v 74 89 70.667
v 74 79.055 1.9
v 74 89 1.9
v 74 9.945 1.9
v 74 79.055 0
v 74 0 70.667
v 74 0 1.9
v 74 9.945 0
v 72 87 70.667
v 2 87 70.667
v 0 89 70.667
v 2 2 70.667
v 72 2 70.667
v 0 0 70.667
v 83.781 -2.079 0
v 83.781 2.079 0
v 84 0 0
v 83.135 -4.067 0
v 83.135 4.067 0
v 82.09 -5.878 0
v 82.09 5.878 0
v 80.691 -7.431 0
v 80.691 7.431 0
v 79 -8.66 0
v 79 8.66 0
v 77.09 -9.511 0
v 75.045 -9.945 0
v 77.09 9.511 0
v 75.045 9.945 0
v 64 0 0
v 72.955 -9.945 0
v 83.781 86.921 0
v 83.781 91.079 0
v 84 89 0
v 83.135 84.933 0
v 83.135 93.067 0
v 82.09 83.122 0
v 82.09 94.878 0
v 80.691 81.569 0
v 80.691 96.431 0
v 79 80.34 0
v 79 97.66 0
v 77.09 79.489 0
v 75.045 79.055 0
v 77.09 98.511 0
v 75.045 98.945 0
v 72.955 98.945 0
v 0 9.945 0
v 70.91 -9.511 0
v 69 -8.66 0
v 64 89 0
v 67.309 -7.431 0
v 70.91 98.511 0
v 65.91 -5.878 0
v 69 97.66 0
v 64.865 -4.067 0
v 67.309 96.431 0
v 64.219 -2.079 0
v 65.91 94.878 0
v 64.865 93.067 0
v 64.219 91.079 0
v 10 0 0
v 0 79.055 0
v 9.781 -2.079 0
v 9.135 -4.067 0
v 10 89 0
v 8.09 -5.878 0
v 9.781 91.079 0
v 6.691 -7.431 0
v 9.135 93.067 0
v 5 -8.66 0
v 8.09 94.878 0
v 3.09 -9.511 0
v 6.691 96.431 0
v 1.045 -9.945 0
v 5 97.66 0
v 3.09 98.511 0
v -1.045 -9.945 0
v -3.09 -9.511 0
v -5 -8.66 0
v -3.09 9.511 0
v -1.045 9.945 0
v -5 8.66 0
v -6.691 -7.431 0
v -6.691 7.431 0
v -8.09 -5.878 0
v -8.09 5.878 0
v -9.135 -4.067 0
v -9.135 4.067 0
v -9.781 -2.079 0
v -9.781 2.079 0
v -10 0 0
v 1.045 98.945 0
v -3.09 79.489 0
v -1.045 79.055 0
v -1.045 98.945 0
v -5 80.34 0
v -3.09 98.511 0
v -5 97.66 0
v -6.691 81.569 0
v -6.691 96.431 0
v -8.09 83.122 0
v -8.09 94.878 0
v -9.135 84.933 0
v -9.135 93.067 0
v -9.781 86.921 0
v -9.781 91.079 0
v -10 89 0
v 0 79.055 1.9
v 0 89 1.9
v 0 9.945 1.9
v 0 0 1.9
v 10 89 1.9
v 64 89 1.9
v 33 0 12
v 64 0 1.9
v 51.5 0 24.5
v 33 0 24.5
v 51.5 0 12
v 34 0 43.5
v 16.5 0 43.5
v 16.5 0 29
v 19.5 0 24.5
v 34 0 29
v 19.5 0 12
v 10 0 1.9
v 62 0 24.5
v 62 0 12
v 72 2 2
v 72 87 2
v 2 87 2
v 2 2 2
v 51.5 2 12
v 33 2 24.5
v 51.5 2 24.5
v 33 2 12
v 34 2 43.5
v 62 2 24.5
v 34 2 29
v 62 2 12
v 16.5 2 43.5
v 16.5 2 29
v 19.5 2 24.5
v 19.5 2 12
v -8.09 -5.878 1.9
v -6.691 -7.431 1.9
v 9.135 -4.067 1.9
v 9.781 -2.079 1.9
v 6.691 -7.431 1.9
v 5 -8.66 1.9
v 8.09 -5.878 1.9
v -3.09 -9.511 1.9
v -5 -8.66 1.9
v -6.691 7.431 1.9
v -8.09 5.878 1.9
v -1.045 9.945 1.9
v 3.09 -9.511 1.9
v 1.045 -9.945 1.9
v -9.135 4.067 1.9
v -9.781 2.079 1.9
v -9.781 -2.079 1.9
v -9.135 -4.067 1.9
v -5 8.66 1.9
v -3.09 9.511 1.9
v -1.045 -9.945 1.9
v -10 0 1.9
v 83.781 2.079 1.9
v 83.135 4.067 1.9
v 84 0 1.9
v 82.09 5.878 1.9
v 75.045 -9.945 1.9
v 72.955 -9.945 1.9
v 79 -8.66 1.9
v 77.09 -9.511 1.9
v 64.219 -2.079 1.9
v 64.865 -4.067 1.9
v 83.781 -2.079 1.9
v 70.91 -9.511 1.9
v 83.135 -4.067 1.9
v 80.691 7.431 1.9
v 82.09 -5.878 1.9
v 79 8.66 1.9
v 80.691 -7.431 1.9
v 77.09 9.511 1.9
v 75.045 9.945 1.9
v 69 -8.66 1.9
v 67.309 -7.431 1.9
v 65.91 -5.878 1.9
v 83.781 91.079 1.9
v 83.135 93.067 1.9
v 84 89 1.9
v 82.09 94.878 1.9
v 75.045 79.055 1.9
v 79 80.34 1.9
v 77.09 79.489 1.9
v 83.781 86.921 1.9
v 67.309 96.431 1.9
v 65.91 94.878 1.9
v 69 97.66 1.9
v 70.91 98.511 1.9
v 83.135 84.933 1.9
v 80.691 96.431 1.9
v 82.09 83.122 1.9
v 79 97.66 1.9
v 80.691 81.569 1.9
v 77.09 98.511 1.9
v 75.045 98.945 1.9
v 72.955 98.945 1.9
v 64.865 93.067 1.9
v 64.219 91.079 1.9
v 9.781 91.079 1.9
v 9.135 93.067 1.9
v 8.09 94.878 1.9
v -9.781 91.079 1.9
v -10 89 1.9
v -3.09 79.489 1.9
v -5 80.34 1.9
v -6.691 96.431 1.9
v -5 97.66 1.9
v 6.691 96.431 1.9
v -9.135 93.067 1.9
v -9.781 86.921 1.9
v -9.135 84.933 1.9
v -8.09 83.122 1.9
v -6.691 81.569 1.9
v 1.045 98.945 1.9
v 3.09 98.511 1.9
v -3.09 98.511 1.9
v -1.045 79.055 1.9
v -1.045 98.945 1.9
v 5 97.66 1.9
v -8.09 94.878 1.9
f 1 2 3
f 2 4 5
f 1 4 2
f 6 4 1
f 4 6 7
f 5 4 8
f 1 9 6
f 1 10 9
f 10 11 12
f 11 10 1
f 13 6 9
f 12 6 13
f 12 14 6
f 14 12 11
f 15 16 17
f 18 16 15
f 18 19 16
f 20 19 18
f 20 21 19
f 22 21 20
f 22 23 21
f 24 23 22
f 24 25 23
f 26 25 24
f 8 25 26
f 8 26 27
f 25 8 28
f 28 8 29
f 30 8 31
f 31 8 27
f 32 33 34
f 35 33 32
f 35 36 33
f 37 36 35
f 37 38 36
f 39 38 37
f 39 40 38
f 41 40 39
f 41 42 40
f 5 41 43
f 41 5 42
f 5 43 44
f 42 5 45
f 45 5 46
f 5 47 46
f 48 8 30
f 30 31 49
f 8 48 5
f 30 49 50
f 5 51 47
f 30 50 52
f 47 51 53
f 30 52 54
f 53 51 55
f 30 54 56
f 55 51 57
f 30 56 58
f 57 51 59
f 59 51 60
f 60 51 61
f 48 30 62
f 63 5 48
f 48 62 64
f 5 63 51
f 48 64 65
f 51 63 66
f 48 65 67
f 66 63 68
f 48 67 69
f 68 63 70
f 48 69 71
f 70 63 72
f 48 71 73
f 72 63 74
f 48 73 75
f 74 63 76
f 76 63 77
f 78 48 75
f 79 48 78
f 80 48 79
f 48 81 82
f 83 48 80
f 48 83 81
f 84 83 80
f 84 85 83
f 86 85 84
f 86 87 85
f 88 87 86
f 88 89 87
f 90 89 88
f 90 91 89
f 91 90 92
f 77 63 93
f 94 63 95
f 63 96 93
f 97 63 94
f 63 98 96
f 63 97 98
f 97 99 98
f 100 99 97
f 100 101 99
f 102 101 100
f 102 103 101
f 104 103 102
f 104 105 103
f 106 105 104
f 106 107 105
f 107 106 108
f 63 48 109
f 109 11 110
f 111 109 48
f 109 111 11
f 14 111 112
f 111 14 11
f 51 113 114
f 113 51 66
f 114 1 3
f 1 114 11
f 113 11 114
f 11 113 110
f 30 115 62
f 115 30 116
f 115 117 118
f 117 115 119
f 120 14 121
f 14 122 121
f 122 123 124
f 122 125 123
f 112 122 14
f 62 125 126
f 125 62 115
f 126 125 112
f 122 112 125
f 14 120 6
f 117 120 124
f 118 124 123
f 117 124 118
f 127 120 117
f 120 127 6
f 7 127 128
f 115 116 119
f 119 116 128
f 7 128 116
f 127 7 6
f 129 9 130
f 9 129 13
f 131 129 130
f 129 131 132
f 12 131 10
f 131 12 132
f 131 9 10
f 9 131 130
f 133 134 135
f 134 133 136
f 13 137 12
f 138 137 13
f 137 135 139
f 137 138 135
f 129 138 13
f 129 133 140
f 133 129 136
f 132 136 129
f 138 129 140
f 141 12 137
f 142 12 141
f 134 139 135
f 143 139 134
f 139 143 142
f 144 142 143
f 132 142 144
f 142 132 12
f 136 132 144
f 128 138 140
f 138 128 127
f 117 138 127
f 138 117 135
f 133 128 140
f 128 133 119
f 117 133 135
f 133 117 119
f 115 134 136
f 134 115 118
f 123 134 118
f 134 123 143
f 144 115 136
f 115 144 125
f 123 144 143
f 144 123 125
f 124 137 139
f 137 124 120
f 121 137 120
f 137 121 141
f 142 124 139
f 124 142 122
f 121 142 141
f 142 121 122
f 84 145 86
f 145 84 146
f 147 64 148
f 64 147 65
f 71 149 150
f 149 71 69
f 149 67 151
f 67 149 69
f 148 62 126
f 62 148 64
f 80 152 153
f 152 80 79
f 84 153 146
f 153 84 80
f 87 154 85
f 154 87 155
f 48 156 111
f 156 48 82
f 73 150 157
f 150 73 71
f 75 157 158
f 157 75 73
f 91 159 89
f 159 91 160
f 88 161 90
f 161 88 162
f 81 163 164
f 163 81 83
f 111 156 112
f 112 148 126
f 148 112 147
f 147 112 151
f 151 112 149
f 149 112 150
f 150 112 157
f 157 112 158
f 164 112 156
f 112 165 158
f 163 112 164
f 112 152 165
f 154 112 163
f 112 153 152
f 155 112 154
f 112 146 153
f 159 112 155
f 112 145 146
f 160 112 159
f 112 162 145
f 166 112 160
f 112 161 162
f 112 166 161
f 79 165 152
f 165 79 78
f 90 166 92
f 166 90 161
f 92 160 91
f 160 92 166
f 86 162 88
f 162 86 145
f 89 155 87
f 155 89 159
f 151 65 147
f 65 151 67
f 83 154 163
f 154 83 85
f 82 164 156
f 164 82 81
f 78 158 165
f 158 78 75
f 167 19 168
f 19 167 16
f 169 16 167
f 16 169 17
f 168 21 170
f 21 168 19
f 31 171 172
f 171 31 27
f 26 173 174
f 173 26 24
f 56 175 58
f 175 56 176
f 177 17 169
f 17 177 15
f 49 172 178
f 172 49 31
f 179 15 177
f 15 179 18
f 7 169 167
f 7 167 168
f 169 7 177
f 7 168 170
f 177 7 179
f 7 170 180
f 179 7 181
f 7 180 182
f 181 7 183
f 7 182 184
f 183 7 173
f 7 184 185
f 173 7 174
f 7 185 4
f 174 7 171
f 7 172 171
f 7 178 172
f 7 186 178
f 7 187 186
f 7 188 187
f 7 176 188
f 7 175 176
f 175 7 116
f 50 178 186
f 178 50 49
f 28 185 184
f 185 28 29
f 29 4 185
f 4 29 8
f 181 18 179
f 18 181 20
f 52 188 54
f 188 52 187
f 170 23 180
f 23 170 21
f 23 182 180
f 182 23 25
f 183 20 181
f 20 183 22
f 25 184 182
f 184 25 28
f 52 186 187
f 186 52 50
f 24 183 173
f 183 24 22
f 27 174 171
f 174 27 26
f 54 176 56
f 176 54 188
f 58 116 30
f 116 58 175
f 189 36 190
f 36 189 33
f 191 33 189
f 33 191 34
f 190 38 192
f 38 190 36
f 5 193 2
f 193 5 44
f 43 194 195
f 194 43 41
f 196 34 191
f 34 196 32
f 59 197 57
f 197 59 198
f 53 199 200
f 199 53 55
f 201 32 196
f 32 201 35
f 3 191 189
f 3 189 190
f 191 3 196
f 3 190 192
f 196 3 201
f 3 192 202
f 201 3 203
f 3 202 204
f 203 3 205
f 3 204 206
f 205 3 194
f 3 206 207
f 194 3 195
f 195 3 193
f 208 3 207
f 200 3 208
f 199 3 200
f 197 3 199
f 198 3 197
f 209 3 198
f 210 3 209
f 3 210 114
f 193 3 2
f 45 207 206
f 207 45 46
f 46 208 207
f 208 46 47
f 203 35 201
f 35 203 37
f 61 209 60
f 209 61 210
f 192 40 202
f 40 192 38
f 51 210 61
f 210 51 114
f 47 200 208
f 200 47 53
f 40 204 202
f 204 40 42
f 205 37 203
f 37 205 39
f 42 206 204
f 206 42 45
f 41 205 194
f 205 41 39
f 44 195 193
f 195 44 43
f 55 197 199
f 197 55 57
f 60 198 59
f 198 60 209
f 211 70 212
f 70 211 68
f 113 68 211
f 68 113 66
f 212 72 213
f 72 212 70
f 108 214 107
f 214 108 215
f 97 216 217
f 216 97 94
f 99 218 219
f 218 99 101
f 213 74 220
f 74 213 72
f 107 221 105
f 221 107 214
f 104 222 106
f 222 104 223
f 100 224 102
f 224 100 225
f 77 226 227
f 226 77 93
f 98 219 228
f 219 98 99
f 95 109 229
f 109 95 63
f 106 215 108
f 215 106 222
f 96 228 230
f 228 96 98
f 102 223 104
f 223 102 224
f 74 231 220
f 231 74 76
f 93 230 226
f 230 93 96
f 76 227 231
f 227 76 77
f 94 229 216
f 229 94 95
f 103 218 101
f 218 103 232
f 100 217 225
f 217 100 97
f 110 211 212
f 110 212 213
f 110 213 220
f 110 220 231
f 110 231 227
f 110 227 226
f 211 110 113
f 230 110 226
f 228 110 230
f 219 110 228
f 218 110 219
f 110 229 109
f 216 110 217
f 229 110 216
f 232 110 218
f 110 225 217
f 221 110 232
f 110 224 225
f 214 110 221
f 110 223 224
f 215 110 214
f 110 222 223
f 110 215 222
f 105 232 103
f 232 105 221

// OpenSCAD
ARDUINO_ACTUAL=[53,69,15];
ARDUINO=[70,85,20];
CENTER=[ARDUINO[0]/2, ARDUINO[1]/2, 0];
WALL_T=2;
CLEAR=0.5;
N_ARDUINOS=3;
TOP_T=ARDUINO[2]/2;
BOX_H=ARDUINO[2]*N_ARDUINOS+ARDUINO[2]/3+WALL_T;

POWER_H=[10+CLEAR, WALL_T*3, 12+CLEAR];
USB_H=[13+CLEAR, WALL_T*3, 12+CLEAR];
ETHER_H=[17+CLEAR, WALL_T*3, 14+CLEAR];

!box();
translate([0, 0, -TOP_T*2])
	top();

module box() {
	union() {
		difference() {
			cube([ARDUINO[0]+WALL_T*2, ARDUINO[1]+WALL_T*2, BOX_H+WALL_T]);
			translate([WALL_T, WALL_T, WALL_T])
				cube([ARDUINO[0], ARDUINO[1], BOX_H+WALL_T+1]);
			translate([WALL_T+CENTER[0]+14.5, -WALL_T, WALL_T+10])
				cube(POWER_H);
			translate([WALL_T+CENTER[0]-4-USB_H[0], -WALL_T, WALL_T+10])
				cube(USB_H);
			translate([WALL_T+CENTER[0]-3-ETHER_H[0], -WALL_T, WALL_T+27])
				cube(ETHER_H);
		}
		cylinder(r=10, h=WALL_T-0.1);
		translate([ARDUINO[0]+WALL_T*2,0,0])
			cylinder(r=10, h=WALL_T-0.1);
		translate([ARDUINO[0]+WALL_T*2,ARDUINO[1]+WALL_T*2,0])
			cylinder(r=10, h=WALL_T-0.1);
		translate([0,ARDUINO[1]+WALL_T*2,0])
			cylinder(r=10, h=WALL_T-0.1);
	}
}

module top() {
	union() {
		difference() {
			translate([-WALL_T, -WALL_T, 0])
				cube([ARDUINO[0]+WALL_T*4, ARDUINO[1]+WALL_T*4, TOP_T+WALL_T]);
			translate([-CLEAR/2, -CLEAR/2, WALL_T])
				cube([ARDUINO[0]+WALL_T*2+CLEAR/2, ARDUINO[1]+WALL_T*2+CLEAR/2, TOP_T+1]);
		}
		cylinder(r=10, h=WALL_T-0.1);
		translate([ARDUINO[0]+WALL_T*2,0,0])
			cylinder(r=10, h=WALL_T-0.1);
		translate([ARDUINO[0]+WALL_T*2,ARDUINO[1]+WALL_T*2,0])
			cylinder(r=10, h=WALL_T-0.1);
		translate([0,ARDUINO[1]+WALL_T*2,0])
			cylinder(r=10, h=WALL_T-0.1);
	}
}
